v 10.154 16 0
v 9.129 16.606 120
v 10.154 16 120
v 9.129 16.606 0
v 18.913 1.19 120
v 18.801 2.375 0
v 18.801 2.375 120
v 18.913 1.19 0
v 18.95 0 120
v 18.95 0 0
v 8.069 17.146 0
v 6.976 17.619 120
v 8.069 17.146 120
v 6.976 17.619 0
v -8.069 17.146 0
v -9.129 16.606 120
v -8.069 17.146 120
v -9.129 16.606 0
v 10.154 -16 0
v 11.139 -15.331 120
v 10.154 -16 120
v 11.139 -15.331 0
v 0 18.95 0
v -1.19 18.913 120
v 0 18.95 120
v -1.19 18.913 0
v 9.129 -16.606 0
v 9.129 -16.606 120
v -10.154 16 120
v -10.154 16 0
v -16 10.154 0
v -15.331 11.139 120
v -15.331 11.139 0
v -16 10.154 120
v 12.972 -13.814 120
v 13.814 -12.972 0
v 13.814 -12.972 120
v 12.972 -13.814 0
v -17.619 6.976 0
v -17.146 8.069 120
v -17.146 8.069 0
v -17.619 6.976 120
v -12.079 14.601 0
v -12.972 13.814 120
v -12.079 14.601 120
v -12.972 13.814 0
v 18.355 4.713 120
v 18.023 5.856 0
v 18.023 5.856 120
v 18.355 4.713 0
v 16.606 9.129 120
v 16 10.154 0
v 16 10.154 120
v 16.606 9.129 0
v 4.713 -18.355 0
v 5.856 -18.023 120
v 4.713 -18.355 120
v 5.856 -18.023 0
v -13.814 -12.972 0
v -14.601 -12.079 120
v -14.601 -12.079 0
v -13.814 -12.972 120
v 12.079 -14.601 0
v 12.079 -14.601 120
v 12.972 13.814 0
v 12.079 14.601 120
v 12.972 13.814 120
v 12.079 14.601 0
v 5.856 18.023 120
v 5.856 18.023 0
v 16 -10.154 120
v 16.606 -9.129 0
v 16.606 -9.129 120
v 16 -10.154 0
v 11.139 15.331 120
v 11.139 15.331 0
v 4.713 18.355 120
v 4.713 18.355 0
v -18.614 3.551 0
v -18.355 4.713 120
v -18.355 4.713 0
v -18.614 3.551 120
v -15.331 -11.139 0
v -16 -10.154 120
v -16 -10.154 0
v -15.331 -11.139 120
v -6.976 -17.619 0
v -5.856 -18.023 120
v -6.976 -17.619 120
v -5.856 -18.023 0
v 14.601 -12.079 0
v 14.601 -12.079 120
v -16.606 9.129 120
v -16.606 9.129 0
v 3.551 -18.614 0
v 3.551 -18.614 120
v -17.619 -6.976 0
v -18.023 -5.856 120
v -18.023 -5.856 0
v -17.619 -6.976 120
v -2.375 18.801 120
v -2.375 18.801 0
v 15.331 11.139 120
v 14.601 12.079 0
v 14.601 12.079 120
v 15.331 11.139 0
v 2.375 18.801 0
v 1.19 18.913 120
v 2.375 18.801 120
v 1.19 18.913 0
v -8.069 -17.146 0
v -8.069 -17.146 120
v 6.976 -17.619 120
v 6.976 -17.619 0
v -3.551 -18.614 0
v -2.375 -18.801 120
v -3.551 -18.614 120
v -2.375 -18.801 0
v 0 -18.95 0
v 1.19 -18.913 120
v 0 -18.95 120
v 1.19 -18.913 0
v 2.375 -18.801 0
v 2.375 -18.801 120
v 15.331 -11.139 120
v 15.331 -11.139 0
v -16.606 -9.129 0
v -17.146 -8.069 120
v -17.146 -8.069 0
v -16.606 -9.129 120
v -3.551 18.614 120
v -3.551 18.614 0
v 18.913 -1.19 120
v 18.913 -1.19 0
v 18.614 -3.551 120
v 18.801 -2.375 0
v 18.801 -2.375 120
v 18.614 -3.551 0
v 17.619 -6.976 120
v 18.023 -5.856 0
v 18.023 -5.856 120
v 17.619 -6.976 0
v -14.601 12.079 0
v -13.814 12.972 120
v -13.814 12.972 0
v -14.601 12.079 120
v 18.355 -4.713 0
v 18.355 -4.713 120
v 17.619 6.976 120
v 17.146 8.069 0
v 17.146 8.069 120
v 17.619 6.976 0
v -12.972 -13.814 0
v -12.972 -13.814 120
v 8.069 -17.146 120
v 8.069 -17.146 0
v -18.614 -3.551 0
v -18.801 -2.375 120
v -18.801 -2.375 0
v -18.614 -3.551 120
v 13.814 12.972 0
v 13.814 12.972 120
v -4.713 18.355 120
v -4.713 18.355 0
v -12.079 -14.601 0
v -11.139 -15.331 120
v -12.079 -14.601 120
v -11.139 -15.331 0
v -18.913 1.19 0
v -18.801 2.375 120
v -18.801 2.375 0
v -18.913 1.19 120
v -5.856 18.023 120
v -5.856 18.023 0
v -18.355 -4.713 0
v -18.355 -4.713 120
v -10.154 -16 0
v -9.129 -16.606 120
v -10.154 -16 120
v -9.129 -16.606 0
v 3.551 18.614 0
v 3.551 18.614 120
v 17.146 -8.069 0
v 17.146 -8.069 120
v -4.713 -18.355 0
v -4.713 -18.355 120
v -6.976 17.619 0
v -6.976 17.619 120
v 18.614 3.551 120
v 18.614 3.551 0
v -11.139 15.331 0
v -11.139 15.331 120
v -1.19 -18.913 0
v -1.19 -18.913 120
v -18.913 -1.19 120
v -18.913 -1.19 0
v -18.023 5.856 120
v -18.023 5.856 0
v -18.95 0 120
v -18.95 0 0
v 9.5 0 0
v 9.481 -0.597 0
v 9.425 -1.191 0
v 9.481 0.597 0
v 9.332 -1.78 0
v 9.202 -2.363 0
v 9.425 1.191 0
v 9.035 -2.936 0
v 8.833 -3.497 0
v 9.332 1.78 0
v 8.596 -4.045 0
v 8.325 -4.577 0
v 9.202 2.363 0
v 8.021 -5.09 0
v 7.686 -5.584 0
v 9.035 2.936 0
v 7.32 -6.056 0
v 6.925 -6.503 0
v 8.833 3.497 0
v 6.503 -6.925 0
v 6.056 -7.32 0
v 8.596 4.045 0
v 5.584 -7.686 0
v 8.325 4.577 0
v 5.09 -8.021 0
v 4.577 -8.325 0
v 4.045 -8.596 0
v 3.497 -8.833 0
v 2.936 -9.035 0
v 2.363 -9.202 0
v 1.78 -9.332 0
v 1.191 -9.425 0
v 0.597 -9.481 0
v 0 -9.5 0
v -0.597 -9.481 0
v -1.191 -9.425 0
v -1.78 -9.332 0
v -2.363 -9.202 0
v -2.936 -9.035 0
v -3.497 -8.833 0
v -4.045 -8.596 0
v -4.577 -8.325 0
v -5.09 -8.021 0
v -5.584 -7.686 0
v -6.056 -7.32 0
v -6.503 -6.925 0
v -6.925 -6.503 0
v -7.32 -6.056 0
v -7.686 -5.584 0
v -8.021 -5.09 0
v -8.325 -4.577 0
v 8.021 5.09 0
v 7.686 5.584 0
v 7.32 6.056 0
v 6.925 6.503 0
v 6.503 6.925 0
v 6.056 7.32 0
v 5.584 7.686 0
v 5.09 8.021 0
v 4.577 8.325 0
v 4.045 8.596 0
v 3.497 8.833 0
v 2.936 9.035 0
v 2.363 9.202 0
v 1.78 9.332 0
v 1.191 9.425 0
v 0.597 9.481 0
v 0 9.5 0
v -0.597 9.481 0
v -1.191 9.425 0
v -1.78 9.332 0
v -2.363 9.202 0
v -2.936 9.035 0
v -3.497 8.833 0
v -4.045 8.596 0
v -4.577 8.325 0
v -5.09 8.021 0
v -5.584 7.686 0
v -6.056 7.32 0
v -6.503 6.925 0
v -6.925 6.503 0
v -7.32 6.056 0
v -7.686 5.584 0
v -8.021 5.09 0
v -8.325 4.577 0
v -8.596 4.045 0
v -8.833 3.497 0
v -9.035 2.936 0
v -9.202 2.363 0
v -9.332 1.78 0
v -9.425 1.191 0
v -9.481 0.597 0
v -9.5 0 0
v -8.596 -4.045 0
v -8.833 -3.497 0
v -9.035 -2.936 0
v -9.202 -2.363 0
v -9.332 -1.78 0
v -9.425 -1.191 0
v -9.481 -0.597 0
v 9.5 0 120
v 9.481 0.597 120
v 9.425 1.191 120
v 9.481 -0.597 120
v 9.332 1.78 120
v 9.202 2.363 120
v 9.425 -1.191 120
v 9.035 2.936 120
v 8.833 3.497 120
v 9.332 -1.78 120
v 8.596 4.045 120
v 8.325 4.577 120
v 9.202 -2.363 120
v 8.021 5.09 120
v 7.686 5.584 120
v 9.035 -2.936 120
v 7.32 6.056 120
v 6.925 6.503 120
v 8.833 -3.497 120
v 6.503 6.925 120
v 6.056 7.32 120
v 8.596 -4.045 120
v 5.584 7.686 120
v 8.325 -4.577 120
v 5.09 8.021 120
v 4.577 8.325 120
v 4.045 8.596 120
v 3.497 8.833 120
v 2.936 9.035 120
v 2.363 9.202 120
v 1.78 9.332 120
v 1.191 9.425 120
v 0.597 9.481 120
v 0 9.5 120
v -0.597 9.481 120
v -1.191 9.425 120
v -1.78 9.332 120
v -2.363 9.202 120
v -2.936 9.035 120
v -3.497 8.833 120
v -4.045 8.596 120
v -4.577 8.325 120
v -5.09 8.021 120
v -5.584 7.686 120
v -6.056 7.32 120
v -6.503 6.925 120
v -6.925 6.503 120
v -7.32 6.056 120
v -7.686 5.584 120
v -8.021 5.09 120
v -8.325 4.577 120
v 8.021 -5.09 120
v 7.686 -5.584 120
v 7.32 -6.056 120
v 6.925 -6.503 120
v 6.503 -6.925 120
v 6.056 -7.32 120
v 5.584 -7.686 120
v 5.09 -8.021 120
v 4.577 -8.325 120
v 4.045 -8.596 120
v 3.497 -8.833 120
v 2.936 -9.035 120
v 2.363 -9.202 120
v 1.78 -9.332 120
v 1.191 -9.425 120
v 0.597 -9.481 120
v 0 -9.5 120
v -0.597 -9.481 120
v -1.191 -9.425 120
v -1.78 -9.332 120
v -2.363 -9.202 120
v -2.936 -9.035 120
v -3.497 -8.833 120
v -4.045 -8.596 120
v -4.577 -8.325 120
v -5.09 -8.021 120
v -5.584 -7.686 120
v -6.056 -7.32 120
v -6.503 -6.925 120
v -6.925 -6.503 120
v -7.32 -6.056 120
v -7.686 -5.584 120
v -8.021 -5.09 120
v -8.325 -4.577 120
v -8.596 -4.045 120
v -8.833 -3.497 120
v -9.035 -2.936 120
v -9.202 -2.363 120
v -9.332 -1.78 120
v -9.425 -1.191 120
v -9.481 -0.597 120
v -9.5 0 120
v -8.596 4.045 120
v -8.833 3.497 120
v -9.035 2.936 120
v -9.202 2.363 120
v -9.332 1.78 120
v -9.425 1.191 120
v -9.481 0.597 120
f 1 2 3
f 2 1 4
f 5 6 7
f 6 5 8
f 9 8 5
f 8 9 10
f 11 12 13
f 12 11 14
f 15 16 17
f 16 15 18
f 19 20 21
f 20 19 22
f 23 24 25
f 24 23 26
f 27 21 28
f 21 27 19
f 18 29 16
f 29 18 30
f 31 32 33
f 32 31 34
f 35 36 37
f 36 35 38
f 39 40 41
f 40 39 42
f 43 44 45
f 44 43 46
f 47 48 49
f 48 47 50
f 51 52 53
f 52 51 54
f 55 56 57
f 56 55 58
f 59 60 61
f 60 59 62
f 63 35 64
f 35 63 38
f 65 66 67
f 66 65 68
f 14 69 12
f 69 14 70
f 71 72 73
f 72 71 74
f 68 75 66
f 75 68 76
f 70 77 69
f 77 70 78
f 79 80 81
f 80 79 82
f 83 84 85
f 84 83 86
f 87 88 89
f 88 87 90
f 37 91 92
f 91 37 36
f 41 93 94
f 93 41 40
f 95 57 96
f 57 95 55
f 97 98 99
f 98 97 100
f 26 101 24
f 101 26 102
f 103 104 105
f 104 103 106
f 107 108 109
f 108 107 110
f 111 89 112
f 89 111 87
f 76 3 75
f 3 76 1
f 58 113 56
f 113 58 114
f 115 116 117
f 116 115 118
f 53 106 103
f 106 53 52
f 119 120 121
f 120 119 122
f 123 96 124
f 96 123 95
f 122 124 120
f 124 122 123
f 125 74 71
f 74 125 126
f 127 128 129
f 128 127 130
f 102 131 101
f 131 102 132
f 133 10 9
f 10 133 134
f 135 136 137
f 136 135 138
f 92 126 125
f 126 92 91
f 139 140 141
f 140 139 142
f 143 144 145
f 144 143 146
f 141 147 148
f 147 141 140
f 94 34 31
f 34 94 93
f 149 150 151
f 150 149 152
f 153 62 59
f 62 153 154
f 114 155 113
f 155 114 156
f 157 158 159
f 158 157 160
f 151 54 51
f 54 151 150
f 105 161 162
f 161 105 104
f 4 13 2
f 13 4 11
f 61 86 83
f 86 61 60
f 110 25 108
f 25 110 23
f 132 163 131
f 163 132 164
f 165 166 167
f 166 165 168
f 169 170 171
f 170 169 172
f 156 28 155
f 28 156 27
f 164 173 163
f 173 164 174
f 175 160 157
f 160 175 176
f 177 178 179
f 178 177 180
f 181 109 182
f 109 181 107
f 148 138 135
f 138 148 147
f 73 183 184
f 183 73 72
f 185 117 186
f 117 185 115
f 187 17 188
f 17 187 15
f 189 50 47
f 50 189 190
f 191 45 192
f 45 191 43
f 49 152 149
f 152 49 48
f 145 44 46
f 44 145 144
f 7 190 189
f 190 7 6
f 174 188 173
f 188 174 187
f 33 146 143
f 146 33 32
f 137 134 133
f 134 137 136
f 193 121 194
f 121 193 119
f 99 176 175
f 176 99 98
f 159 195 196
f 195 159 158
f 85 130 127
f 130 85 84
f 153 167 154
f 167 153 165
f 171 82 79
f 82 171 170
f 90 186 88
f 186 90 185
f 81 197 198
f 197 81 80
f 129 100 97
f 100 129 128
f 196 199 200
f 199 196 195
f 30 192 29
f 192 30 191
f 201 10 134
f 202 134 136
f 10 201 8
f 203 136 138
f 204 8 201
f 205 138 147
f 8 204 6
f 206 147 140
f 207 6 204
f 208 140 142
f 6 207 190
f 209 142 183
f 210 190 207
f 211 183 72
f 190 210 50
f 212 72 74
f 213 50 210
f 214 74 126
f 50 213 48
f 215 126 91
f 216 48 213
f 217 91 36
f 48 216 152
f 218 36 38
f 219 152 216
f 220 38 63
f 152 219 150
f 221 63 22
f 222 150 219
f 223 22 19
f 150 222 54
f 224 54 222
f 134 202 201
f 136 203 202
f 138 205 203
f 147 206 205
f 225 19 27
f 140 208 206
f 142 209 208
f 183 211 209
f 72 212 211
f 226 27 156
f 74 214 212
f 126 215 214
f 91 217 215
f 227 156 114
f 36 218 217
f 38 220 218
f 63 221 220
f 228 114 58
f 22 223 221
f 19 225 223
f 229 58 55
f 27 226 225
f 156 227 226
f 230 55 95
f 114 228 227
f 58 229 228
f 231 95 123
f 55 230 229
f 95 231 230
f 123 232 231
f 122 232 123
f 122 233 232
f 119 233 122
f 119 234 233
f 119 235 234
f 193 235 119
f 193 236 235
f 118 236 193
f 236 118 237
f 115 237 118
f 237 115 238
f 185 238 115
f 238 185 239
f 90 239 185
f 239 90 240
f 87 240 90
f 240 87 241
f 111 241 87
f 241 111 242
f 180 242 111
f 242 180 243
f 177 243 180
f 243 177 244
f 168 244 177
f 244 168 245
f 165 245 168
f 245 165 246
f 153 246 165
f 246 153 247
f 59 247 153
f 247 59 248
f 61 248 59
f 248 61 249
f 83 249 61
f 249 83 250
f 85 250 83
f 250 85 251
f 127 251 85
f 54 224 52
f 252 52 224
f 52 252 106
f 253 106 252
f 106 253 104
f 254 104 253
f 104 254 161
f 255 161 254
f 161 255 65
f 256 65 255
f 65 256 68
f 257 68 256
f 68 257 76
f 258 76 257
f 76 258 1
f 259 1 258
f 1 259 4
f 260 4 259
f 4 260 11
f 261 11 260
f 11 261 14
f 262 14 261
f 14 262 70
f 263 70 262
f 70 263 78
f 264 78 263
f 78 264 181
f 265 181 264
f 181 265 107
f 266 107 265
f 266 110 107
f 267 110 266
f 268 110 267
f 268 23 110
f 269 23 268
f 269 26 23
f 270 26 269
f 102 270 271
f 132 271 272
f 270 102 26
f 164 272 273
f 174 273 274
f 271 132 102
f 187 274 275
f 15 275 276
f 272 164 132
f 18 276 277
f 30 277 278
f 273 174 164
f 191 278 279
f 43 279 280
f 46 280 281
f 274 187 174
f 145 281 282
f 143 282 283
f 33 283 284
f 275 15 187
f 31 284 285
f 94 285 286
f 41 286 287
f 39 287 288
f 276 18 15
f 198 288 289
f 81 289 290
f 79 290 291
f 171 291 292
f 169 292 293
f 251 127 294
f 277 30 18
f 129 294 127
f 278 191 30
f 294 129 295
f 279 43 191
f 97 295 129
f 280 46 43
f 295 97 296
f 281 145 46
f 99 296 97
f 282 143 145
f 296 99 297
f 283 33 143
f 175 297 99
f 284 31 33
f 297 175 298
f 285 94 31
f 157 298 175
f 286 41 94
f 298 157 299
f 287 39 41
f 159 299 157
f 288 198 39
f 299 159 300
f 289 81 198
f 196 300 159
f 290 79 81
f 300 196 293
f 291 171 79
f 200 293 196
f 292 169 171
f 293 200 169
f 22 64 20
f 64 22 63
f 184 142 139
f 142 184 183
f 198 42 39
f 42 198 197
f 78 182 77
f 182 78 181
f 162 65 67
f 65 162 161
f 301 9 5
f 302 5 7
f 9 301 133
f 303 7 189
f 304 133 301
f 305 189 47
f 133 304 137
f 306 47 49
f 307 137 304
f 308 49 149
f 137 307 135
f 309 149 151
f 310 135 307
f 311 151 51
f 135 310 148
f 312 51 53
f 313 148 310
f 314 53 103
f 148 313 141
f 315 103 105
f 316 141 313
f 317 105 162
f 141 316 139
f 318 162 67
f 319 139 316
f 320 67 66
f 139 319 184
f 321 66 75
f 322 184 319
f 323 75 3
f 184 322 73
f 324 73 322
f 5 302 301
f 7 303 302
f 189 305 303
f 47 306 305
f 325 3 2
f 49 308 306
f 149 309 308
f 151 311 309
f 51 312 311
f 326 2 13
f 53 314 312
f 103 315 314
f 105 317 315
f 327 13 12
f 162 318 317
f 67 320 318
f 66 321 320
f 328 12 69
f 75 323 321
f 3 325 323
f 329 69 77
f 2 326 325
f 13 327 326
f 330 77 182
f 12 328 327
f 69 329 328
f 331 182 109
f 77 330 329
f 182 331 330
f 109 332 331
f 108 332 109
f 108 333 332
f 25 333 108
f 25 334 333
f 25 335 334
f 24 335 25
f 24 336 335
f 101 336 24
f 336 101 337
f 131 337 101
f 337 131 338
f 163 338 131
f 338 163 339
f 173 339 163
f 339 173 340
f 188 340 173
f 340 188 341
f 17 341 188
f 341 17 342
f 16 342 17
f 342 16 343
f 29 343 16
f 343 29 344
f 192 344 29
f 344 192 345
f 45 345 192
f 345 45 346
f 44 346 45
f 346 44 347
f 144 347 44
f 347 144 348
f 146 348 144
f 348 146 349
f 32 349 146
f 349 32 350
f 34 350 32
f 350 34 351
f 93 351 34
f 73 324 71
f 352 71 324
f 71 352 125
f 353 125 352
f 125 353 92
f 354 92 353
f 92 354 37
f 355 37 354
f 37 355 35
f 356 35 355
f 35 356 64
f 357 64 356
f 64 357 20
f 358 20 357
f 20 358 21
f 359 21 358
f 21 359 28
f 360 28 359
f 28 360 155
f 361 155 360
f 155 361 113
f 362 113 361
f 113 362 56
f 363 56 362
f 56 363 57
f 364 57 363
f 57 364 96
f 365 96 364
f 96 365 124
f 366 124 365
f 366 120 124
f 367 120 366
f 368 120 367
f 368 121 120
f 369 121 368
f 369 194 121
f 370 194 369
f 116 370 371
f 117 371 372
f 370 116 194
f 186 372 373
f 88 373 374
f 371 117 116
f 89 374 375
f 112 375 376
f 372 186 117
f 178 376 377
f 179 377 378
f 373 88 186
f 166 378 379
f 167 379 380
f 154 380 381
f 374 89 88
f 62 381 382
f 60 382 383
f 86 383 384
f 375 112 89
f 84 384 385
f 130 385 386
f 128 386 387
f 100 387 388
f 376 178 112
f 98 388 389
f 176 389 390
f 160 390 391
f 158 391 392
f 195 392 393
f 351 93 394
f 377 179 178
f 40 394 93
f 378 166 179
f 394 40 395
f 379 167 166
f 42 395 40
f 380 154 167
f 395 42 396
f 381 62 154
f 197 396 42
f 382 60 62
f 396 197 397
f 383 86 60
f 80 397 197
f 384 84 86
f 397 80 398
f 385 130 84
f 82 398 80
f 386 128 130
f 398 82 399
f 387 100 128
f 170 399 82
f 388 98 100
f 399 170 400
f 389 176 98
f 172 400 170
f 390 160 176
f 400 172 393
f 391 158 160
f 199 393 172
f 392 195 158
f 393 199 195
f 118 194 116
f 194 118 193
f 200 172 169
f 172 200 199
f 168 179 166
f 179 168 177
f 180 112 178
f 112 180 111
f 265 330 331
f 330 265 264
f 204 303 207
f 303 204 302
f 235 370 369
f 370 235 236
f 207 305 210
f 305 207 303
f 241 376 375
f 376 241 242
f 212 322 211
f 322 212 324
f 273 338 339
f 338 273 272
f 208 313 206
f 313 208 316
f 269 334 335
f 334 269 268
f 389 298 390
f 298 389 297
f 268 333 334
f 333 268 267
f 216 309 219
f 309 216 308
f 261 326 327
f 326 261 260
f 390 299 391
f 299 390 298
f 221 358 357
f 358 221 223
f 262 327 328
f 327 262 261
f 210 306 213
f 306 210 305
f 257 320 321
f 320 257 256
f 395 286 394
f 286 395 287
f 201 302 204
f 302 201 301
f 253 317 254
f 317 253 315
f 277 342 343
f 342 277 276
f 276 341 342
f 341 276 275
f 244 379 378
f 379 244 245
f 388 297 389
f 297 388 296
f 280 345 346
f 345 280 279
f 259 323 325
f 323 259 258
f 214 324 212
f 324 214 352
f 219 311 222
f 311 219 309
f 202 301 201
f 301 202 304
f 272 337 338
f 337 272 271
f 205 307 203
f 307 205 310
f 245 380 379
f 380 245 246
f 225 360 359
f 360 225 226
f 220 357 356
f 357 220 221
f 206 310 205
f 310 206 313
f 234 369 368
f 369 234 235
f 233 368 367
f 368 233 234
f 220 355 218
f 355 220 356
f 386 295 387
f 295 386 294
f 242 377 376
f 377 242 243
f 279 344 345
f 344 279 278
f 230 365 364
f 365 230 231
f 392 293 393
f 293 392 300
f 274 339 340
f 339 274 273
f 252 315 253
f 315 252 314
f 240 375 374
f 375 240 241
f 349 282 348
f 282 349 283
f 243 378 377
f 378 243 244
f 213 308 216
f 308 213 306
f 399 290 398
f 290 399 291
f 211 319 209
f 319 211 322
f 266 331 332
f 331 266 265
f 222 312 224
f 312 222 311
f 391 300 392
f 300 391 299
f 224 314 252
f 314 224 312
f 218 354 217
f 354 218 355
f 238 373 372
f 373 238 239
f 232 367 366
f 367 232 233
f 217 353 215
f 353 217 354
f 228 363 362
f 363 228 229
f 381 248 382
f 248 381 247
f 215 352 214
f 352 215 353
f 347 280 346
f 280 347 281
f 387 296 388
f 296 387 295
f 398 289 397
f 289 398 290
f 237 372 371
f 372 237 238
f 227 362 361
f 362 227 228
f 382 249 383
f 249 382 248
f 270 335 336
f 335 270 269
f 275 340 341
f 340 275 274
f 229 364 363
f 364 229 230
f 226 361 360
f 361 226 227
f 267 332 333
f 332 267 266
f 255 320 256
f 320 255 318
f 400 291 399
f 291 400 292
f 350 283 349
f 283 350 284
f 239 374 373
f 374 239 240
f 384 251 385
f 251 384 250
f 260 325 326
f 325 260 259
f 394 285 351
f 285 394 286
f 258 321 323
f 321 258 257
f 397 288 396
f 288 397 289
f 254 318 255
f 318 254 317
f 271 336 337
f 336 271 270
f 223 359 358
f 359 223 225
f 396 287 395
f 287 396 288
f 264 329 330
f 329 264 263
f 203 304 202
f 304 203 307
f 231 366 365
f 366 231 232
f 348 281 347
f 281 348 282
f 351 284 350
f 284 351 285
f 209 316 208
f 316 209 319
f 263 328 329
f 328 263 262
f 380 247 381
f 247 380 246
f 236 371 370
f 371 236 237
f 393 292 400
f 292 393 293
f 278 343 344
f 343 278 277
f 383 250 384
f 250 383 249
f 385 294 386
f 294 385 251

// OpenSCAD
/* Cylinder with a hole

To slide onto a horizontal bar of a retort stand (aka "chemistry"
stand) so that the filament roll will turn more easily.  You also can
use this to augment various filament holders and stands made from
filament.

Made by Daniel K. Schneider, TECFA, University of Geneva, August 2012, revised Feb 2016
Licence: Freeware

A hollow cylinder is defined by 5 parameters. It's length, the
diameter of the hole, the outside diameter, extra space added to the
hole diameter and extraspace substracted from the outer diameter.

Measure the diameter of the bar (typically 12mm for a retort stand)
and of the holes of your filament rools.  Use these measures as such,
but you can ajust "extraspace_diameter = 0.25;" and "extra_space" inner.

Adapt parameters if needed.

Hole diameter is 1.2 for a typical retort stand

Filament roll hole diameters seem to vary from 19 to 74 mm. Frequent
ones are 31mm, 39mm and 52mm. Outersize diameter ranges from 12.5cm
(e.g. Taulman T-glase) to 30cm. Typical outer width (length of the
cylinder to print) is from 6cm to 12.5cm. Below the ones that I
printed.

// cylinder_diameter = 31.6; // 
// cylinder_diameter = 38.3; // 
// cylinder_diameter = 50.9; // 

Adjust the length. Add extraspace, e.g. 4cm.

*/


// Diameter of the hole 
hole_diameter = 17; // 

// Extra inner space added to hole diameter
extraspace_hole = 1;

// Diameter of the cylinder (hole of filament roll)
cylinder_diameter = 38.3;

// Outer extra space subtracted from diameter
extraspace_diameter = 0.2;

// Cylinder length
length = 120;


translate ([0,0,length/2]) {
  difference() {
    cylinder (h = length, r=cylinder_diameter / 2 - extraspace_diameter, center = true, $fn=100);
    # cylinder (h = length+2, r=hole_diameter / 2 + extraspace_hole, center = true, $fn=100);
  }
}
